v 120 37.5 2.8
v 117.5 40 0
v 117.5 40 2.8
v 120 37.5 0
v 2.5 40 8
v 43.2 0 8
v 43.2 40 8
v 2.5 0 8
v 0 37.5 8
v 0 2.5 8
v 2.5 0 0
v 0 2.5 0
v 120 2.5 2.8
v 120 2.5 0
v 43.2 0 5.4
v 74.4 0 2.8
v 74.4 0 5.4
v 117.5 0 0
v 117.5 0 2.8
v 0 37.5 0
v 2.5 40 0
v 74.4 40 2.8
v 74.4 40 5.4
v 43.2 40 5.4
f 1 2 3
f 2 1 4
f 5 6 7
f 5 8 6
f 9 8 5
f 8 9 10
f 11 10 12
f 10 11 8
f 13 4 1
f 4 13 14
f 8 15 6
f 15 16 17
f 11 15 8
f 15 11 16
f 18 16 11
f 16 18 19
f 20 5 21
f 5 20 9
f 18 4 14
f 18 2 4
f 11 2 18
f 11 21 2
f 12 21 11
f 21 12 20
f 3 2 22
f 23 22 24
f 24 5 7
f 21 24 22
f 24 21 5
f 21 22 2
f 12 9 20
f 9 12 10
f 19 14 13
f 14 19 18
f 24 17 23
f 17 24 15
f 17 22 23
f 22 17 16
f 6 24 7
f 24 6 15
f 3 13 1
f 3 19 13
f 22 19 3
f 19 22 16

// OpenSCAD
$fn = 32;

// ----------------------------------------------------------------------
// Stepped bar: twostep, 120 x 40 x 8/2.8 mm
// ----------------------------------------------------------------------

// --- parameters (mm) ---
bar_l = 120;              // bar length, X
bar_w = 40;               // bar width, Y
plate_t = 8;              // thickness of the thick zone, Z
thin_t = 2.8;             // thickness of the thin zone
corner_c = 2.5;           // corner chamfer of the bar
step_cut = 5.2;           // material removed from the thin zone
stair1_x = 43.2;          // position of the first stair
stair2_x = 74.4;          // position of the second stair
mid_t = 5.4;              // thickness of the middle zone
depth_1 = 2.6;            // depth of cut 1 from the top face
depth_2 = 5.2;            // depth of cut 2 from the top face

profile = [[2.5, 0], [117.5, 0], [120, 2.5], [120, 37.5], [117.5, 40], [2.5, 40], [0, 37.5], [0, 2.5]];  // primary outline, 8 points, counter clockwise
void_1 = [[43.2, -1], [74.4, -1], [74.4, 41], [43.2, 41]];  // first stair, 4 points
void_2 = [[74.4, -1], [121, -1], [121, 41], [74.4, 41]];  // second stair, 4 points

// --- the one profile operation ---
difference() {
  linear_extrude(height = plate_t) polygon(points = profile);
  translate([0, 0, plate_t - depth_1])
    linear_extrude(height = depth_1 + 1) polygon(points = void_1);
  translate([0, 0, plate_t - depth_2])
    linear_extrude(height = depth_2 + 1) polygon(points = void_2);
}
